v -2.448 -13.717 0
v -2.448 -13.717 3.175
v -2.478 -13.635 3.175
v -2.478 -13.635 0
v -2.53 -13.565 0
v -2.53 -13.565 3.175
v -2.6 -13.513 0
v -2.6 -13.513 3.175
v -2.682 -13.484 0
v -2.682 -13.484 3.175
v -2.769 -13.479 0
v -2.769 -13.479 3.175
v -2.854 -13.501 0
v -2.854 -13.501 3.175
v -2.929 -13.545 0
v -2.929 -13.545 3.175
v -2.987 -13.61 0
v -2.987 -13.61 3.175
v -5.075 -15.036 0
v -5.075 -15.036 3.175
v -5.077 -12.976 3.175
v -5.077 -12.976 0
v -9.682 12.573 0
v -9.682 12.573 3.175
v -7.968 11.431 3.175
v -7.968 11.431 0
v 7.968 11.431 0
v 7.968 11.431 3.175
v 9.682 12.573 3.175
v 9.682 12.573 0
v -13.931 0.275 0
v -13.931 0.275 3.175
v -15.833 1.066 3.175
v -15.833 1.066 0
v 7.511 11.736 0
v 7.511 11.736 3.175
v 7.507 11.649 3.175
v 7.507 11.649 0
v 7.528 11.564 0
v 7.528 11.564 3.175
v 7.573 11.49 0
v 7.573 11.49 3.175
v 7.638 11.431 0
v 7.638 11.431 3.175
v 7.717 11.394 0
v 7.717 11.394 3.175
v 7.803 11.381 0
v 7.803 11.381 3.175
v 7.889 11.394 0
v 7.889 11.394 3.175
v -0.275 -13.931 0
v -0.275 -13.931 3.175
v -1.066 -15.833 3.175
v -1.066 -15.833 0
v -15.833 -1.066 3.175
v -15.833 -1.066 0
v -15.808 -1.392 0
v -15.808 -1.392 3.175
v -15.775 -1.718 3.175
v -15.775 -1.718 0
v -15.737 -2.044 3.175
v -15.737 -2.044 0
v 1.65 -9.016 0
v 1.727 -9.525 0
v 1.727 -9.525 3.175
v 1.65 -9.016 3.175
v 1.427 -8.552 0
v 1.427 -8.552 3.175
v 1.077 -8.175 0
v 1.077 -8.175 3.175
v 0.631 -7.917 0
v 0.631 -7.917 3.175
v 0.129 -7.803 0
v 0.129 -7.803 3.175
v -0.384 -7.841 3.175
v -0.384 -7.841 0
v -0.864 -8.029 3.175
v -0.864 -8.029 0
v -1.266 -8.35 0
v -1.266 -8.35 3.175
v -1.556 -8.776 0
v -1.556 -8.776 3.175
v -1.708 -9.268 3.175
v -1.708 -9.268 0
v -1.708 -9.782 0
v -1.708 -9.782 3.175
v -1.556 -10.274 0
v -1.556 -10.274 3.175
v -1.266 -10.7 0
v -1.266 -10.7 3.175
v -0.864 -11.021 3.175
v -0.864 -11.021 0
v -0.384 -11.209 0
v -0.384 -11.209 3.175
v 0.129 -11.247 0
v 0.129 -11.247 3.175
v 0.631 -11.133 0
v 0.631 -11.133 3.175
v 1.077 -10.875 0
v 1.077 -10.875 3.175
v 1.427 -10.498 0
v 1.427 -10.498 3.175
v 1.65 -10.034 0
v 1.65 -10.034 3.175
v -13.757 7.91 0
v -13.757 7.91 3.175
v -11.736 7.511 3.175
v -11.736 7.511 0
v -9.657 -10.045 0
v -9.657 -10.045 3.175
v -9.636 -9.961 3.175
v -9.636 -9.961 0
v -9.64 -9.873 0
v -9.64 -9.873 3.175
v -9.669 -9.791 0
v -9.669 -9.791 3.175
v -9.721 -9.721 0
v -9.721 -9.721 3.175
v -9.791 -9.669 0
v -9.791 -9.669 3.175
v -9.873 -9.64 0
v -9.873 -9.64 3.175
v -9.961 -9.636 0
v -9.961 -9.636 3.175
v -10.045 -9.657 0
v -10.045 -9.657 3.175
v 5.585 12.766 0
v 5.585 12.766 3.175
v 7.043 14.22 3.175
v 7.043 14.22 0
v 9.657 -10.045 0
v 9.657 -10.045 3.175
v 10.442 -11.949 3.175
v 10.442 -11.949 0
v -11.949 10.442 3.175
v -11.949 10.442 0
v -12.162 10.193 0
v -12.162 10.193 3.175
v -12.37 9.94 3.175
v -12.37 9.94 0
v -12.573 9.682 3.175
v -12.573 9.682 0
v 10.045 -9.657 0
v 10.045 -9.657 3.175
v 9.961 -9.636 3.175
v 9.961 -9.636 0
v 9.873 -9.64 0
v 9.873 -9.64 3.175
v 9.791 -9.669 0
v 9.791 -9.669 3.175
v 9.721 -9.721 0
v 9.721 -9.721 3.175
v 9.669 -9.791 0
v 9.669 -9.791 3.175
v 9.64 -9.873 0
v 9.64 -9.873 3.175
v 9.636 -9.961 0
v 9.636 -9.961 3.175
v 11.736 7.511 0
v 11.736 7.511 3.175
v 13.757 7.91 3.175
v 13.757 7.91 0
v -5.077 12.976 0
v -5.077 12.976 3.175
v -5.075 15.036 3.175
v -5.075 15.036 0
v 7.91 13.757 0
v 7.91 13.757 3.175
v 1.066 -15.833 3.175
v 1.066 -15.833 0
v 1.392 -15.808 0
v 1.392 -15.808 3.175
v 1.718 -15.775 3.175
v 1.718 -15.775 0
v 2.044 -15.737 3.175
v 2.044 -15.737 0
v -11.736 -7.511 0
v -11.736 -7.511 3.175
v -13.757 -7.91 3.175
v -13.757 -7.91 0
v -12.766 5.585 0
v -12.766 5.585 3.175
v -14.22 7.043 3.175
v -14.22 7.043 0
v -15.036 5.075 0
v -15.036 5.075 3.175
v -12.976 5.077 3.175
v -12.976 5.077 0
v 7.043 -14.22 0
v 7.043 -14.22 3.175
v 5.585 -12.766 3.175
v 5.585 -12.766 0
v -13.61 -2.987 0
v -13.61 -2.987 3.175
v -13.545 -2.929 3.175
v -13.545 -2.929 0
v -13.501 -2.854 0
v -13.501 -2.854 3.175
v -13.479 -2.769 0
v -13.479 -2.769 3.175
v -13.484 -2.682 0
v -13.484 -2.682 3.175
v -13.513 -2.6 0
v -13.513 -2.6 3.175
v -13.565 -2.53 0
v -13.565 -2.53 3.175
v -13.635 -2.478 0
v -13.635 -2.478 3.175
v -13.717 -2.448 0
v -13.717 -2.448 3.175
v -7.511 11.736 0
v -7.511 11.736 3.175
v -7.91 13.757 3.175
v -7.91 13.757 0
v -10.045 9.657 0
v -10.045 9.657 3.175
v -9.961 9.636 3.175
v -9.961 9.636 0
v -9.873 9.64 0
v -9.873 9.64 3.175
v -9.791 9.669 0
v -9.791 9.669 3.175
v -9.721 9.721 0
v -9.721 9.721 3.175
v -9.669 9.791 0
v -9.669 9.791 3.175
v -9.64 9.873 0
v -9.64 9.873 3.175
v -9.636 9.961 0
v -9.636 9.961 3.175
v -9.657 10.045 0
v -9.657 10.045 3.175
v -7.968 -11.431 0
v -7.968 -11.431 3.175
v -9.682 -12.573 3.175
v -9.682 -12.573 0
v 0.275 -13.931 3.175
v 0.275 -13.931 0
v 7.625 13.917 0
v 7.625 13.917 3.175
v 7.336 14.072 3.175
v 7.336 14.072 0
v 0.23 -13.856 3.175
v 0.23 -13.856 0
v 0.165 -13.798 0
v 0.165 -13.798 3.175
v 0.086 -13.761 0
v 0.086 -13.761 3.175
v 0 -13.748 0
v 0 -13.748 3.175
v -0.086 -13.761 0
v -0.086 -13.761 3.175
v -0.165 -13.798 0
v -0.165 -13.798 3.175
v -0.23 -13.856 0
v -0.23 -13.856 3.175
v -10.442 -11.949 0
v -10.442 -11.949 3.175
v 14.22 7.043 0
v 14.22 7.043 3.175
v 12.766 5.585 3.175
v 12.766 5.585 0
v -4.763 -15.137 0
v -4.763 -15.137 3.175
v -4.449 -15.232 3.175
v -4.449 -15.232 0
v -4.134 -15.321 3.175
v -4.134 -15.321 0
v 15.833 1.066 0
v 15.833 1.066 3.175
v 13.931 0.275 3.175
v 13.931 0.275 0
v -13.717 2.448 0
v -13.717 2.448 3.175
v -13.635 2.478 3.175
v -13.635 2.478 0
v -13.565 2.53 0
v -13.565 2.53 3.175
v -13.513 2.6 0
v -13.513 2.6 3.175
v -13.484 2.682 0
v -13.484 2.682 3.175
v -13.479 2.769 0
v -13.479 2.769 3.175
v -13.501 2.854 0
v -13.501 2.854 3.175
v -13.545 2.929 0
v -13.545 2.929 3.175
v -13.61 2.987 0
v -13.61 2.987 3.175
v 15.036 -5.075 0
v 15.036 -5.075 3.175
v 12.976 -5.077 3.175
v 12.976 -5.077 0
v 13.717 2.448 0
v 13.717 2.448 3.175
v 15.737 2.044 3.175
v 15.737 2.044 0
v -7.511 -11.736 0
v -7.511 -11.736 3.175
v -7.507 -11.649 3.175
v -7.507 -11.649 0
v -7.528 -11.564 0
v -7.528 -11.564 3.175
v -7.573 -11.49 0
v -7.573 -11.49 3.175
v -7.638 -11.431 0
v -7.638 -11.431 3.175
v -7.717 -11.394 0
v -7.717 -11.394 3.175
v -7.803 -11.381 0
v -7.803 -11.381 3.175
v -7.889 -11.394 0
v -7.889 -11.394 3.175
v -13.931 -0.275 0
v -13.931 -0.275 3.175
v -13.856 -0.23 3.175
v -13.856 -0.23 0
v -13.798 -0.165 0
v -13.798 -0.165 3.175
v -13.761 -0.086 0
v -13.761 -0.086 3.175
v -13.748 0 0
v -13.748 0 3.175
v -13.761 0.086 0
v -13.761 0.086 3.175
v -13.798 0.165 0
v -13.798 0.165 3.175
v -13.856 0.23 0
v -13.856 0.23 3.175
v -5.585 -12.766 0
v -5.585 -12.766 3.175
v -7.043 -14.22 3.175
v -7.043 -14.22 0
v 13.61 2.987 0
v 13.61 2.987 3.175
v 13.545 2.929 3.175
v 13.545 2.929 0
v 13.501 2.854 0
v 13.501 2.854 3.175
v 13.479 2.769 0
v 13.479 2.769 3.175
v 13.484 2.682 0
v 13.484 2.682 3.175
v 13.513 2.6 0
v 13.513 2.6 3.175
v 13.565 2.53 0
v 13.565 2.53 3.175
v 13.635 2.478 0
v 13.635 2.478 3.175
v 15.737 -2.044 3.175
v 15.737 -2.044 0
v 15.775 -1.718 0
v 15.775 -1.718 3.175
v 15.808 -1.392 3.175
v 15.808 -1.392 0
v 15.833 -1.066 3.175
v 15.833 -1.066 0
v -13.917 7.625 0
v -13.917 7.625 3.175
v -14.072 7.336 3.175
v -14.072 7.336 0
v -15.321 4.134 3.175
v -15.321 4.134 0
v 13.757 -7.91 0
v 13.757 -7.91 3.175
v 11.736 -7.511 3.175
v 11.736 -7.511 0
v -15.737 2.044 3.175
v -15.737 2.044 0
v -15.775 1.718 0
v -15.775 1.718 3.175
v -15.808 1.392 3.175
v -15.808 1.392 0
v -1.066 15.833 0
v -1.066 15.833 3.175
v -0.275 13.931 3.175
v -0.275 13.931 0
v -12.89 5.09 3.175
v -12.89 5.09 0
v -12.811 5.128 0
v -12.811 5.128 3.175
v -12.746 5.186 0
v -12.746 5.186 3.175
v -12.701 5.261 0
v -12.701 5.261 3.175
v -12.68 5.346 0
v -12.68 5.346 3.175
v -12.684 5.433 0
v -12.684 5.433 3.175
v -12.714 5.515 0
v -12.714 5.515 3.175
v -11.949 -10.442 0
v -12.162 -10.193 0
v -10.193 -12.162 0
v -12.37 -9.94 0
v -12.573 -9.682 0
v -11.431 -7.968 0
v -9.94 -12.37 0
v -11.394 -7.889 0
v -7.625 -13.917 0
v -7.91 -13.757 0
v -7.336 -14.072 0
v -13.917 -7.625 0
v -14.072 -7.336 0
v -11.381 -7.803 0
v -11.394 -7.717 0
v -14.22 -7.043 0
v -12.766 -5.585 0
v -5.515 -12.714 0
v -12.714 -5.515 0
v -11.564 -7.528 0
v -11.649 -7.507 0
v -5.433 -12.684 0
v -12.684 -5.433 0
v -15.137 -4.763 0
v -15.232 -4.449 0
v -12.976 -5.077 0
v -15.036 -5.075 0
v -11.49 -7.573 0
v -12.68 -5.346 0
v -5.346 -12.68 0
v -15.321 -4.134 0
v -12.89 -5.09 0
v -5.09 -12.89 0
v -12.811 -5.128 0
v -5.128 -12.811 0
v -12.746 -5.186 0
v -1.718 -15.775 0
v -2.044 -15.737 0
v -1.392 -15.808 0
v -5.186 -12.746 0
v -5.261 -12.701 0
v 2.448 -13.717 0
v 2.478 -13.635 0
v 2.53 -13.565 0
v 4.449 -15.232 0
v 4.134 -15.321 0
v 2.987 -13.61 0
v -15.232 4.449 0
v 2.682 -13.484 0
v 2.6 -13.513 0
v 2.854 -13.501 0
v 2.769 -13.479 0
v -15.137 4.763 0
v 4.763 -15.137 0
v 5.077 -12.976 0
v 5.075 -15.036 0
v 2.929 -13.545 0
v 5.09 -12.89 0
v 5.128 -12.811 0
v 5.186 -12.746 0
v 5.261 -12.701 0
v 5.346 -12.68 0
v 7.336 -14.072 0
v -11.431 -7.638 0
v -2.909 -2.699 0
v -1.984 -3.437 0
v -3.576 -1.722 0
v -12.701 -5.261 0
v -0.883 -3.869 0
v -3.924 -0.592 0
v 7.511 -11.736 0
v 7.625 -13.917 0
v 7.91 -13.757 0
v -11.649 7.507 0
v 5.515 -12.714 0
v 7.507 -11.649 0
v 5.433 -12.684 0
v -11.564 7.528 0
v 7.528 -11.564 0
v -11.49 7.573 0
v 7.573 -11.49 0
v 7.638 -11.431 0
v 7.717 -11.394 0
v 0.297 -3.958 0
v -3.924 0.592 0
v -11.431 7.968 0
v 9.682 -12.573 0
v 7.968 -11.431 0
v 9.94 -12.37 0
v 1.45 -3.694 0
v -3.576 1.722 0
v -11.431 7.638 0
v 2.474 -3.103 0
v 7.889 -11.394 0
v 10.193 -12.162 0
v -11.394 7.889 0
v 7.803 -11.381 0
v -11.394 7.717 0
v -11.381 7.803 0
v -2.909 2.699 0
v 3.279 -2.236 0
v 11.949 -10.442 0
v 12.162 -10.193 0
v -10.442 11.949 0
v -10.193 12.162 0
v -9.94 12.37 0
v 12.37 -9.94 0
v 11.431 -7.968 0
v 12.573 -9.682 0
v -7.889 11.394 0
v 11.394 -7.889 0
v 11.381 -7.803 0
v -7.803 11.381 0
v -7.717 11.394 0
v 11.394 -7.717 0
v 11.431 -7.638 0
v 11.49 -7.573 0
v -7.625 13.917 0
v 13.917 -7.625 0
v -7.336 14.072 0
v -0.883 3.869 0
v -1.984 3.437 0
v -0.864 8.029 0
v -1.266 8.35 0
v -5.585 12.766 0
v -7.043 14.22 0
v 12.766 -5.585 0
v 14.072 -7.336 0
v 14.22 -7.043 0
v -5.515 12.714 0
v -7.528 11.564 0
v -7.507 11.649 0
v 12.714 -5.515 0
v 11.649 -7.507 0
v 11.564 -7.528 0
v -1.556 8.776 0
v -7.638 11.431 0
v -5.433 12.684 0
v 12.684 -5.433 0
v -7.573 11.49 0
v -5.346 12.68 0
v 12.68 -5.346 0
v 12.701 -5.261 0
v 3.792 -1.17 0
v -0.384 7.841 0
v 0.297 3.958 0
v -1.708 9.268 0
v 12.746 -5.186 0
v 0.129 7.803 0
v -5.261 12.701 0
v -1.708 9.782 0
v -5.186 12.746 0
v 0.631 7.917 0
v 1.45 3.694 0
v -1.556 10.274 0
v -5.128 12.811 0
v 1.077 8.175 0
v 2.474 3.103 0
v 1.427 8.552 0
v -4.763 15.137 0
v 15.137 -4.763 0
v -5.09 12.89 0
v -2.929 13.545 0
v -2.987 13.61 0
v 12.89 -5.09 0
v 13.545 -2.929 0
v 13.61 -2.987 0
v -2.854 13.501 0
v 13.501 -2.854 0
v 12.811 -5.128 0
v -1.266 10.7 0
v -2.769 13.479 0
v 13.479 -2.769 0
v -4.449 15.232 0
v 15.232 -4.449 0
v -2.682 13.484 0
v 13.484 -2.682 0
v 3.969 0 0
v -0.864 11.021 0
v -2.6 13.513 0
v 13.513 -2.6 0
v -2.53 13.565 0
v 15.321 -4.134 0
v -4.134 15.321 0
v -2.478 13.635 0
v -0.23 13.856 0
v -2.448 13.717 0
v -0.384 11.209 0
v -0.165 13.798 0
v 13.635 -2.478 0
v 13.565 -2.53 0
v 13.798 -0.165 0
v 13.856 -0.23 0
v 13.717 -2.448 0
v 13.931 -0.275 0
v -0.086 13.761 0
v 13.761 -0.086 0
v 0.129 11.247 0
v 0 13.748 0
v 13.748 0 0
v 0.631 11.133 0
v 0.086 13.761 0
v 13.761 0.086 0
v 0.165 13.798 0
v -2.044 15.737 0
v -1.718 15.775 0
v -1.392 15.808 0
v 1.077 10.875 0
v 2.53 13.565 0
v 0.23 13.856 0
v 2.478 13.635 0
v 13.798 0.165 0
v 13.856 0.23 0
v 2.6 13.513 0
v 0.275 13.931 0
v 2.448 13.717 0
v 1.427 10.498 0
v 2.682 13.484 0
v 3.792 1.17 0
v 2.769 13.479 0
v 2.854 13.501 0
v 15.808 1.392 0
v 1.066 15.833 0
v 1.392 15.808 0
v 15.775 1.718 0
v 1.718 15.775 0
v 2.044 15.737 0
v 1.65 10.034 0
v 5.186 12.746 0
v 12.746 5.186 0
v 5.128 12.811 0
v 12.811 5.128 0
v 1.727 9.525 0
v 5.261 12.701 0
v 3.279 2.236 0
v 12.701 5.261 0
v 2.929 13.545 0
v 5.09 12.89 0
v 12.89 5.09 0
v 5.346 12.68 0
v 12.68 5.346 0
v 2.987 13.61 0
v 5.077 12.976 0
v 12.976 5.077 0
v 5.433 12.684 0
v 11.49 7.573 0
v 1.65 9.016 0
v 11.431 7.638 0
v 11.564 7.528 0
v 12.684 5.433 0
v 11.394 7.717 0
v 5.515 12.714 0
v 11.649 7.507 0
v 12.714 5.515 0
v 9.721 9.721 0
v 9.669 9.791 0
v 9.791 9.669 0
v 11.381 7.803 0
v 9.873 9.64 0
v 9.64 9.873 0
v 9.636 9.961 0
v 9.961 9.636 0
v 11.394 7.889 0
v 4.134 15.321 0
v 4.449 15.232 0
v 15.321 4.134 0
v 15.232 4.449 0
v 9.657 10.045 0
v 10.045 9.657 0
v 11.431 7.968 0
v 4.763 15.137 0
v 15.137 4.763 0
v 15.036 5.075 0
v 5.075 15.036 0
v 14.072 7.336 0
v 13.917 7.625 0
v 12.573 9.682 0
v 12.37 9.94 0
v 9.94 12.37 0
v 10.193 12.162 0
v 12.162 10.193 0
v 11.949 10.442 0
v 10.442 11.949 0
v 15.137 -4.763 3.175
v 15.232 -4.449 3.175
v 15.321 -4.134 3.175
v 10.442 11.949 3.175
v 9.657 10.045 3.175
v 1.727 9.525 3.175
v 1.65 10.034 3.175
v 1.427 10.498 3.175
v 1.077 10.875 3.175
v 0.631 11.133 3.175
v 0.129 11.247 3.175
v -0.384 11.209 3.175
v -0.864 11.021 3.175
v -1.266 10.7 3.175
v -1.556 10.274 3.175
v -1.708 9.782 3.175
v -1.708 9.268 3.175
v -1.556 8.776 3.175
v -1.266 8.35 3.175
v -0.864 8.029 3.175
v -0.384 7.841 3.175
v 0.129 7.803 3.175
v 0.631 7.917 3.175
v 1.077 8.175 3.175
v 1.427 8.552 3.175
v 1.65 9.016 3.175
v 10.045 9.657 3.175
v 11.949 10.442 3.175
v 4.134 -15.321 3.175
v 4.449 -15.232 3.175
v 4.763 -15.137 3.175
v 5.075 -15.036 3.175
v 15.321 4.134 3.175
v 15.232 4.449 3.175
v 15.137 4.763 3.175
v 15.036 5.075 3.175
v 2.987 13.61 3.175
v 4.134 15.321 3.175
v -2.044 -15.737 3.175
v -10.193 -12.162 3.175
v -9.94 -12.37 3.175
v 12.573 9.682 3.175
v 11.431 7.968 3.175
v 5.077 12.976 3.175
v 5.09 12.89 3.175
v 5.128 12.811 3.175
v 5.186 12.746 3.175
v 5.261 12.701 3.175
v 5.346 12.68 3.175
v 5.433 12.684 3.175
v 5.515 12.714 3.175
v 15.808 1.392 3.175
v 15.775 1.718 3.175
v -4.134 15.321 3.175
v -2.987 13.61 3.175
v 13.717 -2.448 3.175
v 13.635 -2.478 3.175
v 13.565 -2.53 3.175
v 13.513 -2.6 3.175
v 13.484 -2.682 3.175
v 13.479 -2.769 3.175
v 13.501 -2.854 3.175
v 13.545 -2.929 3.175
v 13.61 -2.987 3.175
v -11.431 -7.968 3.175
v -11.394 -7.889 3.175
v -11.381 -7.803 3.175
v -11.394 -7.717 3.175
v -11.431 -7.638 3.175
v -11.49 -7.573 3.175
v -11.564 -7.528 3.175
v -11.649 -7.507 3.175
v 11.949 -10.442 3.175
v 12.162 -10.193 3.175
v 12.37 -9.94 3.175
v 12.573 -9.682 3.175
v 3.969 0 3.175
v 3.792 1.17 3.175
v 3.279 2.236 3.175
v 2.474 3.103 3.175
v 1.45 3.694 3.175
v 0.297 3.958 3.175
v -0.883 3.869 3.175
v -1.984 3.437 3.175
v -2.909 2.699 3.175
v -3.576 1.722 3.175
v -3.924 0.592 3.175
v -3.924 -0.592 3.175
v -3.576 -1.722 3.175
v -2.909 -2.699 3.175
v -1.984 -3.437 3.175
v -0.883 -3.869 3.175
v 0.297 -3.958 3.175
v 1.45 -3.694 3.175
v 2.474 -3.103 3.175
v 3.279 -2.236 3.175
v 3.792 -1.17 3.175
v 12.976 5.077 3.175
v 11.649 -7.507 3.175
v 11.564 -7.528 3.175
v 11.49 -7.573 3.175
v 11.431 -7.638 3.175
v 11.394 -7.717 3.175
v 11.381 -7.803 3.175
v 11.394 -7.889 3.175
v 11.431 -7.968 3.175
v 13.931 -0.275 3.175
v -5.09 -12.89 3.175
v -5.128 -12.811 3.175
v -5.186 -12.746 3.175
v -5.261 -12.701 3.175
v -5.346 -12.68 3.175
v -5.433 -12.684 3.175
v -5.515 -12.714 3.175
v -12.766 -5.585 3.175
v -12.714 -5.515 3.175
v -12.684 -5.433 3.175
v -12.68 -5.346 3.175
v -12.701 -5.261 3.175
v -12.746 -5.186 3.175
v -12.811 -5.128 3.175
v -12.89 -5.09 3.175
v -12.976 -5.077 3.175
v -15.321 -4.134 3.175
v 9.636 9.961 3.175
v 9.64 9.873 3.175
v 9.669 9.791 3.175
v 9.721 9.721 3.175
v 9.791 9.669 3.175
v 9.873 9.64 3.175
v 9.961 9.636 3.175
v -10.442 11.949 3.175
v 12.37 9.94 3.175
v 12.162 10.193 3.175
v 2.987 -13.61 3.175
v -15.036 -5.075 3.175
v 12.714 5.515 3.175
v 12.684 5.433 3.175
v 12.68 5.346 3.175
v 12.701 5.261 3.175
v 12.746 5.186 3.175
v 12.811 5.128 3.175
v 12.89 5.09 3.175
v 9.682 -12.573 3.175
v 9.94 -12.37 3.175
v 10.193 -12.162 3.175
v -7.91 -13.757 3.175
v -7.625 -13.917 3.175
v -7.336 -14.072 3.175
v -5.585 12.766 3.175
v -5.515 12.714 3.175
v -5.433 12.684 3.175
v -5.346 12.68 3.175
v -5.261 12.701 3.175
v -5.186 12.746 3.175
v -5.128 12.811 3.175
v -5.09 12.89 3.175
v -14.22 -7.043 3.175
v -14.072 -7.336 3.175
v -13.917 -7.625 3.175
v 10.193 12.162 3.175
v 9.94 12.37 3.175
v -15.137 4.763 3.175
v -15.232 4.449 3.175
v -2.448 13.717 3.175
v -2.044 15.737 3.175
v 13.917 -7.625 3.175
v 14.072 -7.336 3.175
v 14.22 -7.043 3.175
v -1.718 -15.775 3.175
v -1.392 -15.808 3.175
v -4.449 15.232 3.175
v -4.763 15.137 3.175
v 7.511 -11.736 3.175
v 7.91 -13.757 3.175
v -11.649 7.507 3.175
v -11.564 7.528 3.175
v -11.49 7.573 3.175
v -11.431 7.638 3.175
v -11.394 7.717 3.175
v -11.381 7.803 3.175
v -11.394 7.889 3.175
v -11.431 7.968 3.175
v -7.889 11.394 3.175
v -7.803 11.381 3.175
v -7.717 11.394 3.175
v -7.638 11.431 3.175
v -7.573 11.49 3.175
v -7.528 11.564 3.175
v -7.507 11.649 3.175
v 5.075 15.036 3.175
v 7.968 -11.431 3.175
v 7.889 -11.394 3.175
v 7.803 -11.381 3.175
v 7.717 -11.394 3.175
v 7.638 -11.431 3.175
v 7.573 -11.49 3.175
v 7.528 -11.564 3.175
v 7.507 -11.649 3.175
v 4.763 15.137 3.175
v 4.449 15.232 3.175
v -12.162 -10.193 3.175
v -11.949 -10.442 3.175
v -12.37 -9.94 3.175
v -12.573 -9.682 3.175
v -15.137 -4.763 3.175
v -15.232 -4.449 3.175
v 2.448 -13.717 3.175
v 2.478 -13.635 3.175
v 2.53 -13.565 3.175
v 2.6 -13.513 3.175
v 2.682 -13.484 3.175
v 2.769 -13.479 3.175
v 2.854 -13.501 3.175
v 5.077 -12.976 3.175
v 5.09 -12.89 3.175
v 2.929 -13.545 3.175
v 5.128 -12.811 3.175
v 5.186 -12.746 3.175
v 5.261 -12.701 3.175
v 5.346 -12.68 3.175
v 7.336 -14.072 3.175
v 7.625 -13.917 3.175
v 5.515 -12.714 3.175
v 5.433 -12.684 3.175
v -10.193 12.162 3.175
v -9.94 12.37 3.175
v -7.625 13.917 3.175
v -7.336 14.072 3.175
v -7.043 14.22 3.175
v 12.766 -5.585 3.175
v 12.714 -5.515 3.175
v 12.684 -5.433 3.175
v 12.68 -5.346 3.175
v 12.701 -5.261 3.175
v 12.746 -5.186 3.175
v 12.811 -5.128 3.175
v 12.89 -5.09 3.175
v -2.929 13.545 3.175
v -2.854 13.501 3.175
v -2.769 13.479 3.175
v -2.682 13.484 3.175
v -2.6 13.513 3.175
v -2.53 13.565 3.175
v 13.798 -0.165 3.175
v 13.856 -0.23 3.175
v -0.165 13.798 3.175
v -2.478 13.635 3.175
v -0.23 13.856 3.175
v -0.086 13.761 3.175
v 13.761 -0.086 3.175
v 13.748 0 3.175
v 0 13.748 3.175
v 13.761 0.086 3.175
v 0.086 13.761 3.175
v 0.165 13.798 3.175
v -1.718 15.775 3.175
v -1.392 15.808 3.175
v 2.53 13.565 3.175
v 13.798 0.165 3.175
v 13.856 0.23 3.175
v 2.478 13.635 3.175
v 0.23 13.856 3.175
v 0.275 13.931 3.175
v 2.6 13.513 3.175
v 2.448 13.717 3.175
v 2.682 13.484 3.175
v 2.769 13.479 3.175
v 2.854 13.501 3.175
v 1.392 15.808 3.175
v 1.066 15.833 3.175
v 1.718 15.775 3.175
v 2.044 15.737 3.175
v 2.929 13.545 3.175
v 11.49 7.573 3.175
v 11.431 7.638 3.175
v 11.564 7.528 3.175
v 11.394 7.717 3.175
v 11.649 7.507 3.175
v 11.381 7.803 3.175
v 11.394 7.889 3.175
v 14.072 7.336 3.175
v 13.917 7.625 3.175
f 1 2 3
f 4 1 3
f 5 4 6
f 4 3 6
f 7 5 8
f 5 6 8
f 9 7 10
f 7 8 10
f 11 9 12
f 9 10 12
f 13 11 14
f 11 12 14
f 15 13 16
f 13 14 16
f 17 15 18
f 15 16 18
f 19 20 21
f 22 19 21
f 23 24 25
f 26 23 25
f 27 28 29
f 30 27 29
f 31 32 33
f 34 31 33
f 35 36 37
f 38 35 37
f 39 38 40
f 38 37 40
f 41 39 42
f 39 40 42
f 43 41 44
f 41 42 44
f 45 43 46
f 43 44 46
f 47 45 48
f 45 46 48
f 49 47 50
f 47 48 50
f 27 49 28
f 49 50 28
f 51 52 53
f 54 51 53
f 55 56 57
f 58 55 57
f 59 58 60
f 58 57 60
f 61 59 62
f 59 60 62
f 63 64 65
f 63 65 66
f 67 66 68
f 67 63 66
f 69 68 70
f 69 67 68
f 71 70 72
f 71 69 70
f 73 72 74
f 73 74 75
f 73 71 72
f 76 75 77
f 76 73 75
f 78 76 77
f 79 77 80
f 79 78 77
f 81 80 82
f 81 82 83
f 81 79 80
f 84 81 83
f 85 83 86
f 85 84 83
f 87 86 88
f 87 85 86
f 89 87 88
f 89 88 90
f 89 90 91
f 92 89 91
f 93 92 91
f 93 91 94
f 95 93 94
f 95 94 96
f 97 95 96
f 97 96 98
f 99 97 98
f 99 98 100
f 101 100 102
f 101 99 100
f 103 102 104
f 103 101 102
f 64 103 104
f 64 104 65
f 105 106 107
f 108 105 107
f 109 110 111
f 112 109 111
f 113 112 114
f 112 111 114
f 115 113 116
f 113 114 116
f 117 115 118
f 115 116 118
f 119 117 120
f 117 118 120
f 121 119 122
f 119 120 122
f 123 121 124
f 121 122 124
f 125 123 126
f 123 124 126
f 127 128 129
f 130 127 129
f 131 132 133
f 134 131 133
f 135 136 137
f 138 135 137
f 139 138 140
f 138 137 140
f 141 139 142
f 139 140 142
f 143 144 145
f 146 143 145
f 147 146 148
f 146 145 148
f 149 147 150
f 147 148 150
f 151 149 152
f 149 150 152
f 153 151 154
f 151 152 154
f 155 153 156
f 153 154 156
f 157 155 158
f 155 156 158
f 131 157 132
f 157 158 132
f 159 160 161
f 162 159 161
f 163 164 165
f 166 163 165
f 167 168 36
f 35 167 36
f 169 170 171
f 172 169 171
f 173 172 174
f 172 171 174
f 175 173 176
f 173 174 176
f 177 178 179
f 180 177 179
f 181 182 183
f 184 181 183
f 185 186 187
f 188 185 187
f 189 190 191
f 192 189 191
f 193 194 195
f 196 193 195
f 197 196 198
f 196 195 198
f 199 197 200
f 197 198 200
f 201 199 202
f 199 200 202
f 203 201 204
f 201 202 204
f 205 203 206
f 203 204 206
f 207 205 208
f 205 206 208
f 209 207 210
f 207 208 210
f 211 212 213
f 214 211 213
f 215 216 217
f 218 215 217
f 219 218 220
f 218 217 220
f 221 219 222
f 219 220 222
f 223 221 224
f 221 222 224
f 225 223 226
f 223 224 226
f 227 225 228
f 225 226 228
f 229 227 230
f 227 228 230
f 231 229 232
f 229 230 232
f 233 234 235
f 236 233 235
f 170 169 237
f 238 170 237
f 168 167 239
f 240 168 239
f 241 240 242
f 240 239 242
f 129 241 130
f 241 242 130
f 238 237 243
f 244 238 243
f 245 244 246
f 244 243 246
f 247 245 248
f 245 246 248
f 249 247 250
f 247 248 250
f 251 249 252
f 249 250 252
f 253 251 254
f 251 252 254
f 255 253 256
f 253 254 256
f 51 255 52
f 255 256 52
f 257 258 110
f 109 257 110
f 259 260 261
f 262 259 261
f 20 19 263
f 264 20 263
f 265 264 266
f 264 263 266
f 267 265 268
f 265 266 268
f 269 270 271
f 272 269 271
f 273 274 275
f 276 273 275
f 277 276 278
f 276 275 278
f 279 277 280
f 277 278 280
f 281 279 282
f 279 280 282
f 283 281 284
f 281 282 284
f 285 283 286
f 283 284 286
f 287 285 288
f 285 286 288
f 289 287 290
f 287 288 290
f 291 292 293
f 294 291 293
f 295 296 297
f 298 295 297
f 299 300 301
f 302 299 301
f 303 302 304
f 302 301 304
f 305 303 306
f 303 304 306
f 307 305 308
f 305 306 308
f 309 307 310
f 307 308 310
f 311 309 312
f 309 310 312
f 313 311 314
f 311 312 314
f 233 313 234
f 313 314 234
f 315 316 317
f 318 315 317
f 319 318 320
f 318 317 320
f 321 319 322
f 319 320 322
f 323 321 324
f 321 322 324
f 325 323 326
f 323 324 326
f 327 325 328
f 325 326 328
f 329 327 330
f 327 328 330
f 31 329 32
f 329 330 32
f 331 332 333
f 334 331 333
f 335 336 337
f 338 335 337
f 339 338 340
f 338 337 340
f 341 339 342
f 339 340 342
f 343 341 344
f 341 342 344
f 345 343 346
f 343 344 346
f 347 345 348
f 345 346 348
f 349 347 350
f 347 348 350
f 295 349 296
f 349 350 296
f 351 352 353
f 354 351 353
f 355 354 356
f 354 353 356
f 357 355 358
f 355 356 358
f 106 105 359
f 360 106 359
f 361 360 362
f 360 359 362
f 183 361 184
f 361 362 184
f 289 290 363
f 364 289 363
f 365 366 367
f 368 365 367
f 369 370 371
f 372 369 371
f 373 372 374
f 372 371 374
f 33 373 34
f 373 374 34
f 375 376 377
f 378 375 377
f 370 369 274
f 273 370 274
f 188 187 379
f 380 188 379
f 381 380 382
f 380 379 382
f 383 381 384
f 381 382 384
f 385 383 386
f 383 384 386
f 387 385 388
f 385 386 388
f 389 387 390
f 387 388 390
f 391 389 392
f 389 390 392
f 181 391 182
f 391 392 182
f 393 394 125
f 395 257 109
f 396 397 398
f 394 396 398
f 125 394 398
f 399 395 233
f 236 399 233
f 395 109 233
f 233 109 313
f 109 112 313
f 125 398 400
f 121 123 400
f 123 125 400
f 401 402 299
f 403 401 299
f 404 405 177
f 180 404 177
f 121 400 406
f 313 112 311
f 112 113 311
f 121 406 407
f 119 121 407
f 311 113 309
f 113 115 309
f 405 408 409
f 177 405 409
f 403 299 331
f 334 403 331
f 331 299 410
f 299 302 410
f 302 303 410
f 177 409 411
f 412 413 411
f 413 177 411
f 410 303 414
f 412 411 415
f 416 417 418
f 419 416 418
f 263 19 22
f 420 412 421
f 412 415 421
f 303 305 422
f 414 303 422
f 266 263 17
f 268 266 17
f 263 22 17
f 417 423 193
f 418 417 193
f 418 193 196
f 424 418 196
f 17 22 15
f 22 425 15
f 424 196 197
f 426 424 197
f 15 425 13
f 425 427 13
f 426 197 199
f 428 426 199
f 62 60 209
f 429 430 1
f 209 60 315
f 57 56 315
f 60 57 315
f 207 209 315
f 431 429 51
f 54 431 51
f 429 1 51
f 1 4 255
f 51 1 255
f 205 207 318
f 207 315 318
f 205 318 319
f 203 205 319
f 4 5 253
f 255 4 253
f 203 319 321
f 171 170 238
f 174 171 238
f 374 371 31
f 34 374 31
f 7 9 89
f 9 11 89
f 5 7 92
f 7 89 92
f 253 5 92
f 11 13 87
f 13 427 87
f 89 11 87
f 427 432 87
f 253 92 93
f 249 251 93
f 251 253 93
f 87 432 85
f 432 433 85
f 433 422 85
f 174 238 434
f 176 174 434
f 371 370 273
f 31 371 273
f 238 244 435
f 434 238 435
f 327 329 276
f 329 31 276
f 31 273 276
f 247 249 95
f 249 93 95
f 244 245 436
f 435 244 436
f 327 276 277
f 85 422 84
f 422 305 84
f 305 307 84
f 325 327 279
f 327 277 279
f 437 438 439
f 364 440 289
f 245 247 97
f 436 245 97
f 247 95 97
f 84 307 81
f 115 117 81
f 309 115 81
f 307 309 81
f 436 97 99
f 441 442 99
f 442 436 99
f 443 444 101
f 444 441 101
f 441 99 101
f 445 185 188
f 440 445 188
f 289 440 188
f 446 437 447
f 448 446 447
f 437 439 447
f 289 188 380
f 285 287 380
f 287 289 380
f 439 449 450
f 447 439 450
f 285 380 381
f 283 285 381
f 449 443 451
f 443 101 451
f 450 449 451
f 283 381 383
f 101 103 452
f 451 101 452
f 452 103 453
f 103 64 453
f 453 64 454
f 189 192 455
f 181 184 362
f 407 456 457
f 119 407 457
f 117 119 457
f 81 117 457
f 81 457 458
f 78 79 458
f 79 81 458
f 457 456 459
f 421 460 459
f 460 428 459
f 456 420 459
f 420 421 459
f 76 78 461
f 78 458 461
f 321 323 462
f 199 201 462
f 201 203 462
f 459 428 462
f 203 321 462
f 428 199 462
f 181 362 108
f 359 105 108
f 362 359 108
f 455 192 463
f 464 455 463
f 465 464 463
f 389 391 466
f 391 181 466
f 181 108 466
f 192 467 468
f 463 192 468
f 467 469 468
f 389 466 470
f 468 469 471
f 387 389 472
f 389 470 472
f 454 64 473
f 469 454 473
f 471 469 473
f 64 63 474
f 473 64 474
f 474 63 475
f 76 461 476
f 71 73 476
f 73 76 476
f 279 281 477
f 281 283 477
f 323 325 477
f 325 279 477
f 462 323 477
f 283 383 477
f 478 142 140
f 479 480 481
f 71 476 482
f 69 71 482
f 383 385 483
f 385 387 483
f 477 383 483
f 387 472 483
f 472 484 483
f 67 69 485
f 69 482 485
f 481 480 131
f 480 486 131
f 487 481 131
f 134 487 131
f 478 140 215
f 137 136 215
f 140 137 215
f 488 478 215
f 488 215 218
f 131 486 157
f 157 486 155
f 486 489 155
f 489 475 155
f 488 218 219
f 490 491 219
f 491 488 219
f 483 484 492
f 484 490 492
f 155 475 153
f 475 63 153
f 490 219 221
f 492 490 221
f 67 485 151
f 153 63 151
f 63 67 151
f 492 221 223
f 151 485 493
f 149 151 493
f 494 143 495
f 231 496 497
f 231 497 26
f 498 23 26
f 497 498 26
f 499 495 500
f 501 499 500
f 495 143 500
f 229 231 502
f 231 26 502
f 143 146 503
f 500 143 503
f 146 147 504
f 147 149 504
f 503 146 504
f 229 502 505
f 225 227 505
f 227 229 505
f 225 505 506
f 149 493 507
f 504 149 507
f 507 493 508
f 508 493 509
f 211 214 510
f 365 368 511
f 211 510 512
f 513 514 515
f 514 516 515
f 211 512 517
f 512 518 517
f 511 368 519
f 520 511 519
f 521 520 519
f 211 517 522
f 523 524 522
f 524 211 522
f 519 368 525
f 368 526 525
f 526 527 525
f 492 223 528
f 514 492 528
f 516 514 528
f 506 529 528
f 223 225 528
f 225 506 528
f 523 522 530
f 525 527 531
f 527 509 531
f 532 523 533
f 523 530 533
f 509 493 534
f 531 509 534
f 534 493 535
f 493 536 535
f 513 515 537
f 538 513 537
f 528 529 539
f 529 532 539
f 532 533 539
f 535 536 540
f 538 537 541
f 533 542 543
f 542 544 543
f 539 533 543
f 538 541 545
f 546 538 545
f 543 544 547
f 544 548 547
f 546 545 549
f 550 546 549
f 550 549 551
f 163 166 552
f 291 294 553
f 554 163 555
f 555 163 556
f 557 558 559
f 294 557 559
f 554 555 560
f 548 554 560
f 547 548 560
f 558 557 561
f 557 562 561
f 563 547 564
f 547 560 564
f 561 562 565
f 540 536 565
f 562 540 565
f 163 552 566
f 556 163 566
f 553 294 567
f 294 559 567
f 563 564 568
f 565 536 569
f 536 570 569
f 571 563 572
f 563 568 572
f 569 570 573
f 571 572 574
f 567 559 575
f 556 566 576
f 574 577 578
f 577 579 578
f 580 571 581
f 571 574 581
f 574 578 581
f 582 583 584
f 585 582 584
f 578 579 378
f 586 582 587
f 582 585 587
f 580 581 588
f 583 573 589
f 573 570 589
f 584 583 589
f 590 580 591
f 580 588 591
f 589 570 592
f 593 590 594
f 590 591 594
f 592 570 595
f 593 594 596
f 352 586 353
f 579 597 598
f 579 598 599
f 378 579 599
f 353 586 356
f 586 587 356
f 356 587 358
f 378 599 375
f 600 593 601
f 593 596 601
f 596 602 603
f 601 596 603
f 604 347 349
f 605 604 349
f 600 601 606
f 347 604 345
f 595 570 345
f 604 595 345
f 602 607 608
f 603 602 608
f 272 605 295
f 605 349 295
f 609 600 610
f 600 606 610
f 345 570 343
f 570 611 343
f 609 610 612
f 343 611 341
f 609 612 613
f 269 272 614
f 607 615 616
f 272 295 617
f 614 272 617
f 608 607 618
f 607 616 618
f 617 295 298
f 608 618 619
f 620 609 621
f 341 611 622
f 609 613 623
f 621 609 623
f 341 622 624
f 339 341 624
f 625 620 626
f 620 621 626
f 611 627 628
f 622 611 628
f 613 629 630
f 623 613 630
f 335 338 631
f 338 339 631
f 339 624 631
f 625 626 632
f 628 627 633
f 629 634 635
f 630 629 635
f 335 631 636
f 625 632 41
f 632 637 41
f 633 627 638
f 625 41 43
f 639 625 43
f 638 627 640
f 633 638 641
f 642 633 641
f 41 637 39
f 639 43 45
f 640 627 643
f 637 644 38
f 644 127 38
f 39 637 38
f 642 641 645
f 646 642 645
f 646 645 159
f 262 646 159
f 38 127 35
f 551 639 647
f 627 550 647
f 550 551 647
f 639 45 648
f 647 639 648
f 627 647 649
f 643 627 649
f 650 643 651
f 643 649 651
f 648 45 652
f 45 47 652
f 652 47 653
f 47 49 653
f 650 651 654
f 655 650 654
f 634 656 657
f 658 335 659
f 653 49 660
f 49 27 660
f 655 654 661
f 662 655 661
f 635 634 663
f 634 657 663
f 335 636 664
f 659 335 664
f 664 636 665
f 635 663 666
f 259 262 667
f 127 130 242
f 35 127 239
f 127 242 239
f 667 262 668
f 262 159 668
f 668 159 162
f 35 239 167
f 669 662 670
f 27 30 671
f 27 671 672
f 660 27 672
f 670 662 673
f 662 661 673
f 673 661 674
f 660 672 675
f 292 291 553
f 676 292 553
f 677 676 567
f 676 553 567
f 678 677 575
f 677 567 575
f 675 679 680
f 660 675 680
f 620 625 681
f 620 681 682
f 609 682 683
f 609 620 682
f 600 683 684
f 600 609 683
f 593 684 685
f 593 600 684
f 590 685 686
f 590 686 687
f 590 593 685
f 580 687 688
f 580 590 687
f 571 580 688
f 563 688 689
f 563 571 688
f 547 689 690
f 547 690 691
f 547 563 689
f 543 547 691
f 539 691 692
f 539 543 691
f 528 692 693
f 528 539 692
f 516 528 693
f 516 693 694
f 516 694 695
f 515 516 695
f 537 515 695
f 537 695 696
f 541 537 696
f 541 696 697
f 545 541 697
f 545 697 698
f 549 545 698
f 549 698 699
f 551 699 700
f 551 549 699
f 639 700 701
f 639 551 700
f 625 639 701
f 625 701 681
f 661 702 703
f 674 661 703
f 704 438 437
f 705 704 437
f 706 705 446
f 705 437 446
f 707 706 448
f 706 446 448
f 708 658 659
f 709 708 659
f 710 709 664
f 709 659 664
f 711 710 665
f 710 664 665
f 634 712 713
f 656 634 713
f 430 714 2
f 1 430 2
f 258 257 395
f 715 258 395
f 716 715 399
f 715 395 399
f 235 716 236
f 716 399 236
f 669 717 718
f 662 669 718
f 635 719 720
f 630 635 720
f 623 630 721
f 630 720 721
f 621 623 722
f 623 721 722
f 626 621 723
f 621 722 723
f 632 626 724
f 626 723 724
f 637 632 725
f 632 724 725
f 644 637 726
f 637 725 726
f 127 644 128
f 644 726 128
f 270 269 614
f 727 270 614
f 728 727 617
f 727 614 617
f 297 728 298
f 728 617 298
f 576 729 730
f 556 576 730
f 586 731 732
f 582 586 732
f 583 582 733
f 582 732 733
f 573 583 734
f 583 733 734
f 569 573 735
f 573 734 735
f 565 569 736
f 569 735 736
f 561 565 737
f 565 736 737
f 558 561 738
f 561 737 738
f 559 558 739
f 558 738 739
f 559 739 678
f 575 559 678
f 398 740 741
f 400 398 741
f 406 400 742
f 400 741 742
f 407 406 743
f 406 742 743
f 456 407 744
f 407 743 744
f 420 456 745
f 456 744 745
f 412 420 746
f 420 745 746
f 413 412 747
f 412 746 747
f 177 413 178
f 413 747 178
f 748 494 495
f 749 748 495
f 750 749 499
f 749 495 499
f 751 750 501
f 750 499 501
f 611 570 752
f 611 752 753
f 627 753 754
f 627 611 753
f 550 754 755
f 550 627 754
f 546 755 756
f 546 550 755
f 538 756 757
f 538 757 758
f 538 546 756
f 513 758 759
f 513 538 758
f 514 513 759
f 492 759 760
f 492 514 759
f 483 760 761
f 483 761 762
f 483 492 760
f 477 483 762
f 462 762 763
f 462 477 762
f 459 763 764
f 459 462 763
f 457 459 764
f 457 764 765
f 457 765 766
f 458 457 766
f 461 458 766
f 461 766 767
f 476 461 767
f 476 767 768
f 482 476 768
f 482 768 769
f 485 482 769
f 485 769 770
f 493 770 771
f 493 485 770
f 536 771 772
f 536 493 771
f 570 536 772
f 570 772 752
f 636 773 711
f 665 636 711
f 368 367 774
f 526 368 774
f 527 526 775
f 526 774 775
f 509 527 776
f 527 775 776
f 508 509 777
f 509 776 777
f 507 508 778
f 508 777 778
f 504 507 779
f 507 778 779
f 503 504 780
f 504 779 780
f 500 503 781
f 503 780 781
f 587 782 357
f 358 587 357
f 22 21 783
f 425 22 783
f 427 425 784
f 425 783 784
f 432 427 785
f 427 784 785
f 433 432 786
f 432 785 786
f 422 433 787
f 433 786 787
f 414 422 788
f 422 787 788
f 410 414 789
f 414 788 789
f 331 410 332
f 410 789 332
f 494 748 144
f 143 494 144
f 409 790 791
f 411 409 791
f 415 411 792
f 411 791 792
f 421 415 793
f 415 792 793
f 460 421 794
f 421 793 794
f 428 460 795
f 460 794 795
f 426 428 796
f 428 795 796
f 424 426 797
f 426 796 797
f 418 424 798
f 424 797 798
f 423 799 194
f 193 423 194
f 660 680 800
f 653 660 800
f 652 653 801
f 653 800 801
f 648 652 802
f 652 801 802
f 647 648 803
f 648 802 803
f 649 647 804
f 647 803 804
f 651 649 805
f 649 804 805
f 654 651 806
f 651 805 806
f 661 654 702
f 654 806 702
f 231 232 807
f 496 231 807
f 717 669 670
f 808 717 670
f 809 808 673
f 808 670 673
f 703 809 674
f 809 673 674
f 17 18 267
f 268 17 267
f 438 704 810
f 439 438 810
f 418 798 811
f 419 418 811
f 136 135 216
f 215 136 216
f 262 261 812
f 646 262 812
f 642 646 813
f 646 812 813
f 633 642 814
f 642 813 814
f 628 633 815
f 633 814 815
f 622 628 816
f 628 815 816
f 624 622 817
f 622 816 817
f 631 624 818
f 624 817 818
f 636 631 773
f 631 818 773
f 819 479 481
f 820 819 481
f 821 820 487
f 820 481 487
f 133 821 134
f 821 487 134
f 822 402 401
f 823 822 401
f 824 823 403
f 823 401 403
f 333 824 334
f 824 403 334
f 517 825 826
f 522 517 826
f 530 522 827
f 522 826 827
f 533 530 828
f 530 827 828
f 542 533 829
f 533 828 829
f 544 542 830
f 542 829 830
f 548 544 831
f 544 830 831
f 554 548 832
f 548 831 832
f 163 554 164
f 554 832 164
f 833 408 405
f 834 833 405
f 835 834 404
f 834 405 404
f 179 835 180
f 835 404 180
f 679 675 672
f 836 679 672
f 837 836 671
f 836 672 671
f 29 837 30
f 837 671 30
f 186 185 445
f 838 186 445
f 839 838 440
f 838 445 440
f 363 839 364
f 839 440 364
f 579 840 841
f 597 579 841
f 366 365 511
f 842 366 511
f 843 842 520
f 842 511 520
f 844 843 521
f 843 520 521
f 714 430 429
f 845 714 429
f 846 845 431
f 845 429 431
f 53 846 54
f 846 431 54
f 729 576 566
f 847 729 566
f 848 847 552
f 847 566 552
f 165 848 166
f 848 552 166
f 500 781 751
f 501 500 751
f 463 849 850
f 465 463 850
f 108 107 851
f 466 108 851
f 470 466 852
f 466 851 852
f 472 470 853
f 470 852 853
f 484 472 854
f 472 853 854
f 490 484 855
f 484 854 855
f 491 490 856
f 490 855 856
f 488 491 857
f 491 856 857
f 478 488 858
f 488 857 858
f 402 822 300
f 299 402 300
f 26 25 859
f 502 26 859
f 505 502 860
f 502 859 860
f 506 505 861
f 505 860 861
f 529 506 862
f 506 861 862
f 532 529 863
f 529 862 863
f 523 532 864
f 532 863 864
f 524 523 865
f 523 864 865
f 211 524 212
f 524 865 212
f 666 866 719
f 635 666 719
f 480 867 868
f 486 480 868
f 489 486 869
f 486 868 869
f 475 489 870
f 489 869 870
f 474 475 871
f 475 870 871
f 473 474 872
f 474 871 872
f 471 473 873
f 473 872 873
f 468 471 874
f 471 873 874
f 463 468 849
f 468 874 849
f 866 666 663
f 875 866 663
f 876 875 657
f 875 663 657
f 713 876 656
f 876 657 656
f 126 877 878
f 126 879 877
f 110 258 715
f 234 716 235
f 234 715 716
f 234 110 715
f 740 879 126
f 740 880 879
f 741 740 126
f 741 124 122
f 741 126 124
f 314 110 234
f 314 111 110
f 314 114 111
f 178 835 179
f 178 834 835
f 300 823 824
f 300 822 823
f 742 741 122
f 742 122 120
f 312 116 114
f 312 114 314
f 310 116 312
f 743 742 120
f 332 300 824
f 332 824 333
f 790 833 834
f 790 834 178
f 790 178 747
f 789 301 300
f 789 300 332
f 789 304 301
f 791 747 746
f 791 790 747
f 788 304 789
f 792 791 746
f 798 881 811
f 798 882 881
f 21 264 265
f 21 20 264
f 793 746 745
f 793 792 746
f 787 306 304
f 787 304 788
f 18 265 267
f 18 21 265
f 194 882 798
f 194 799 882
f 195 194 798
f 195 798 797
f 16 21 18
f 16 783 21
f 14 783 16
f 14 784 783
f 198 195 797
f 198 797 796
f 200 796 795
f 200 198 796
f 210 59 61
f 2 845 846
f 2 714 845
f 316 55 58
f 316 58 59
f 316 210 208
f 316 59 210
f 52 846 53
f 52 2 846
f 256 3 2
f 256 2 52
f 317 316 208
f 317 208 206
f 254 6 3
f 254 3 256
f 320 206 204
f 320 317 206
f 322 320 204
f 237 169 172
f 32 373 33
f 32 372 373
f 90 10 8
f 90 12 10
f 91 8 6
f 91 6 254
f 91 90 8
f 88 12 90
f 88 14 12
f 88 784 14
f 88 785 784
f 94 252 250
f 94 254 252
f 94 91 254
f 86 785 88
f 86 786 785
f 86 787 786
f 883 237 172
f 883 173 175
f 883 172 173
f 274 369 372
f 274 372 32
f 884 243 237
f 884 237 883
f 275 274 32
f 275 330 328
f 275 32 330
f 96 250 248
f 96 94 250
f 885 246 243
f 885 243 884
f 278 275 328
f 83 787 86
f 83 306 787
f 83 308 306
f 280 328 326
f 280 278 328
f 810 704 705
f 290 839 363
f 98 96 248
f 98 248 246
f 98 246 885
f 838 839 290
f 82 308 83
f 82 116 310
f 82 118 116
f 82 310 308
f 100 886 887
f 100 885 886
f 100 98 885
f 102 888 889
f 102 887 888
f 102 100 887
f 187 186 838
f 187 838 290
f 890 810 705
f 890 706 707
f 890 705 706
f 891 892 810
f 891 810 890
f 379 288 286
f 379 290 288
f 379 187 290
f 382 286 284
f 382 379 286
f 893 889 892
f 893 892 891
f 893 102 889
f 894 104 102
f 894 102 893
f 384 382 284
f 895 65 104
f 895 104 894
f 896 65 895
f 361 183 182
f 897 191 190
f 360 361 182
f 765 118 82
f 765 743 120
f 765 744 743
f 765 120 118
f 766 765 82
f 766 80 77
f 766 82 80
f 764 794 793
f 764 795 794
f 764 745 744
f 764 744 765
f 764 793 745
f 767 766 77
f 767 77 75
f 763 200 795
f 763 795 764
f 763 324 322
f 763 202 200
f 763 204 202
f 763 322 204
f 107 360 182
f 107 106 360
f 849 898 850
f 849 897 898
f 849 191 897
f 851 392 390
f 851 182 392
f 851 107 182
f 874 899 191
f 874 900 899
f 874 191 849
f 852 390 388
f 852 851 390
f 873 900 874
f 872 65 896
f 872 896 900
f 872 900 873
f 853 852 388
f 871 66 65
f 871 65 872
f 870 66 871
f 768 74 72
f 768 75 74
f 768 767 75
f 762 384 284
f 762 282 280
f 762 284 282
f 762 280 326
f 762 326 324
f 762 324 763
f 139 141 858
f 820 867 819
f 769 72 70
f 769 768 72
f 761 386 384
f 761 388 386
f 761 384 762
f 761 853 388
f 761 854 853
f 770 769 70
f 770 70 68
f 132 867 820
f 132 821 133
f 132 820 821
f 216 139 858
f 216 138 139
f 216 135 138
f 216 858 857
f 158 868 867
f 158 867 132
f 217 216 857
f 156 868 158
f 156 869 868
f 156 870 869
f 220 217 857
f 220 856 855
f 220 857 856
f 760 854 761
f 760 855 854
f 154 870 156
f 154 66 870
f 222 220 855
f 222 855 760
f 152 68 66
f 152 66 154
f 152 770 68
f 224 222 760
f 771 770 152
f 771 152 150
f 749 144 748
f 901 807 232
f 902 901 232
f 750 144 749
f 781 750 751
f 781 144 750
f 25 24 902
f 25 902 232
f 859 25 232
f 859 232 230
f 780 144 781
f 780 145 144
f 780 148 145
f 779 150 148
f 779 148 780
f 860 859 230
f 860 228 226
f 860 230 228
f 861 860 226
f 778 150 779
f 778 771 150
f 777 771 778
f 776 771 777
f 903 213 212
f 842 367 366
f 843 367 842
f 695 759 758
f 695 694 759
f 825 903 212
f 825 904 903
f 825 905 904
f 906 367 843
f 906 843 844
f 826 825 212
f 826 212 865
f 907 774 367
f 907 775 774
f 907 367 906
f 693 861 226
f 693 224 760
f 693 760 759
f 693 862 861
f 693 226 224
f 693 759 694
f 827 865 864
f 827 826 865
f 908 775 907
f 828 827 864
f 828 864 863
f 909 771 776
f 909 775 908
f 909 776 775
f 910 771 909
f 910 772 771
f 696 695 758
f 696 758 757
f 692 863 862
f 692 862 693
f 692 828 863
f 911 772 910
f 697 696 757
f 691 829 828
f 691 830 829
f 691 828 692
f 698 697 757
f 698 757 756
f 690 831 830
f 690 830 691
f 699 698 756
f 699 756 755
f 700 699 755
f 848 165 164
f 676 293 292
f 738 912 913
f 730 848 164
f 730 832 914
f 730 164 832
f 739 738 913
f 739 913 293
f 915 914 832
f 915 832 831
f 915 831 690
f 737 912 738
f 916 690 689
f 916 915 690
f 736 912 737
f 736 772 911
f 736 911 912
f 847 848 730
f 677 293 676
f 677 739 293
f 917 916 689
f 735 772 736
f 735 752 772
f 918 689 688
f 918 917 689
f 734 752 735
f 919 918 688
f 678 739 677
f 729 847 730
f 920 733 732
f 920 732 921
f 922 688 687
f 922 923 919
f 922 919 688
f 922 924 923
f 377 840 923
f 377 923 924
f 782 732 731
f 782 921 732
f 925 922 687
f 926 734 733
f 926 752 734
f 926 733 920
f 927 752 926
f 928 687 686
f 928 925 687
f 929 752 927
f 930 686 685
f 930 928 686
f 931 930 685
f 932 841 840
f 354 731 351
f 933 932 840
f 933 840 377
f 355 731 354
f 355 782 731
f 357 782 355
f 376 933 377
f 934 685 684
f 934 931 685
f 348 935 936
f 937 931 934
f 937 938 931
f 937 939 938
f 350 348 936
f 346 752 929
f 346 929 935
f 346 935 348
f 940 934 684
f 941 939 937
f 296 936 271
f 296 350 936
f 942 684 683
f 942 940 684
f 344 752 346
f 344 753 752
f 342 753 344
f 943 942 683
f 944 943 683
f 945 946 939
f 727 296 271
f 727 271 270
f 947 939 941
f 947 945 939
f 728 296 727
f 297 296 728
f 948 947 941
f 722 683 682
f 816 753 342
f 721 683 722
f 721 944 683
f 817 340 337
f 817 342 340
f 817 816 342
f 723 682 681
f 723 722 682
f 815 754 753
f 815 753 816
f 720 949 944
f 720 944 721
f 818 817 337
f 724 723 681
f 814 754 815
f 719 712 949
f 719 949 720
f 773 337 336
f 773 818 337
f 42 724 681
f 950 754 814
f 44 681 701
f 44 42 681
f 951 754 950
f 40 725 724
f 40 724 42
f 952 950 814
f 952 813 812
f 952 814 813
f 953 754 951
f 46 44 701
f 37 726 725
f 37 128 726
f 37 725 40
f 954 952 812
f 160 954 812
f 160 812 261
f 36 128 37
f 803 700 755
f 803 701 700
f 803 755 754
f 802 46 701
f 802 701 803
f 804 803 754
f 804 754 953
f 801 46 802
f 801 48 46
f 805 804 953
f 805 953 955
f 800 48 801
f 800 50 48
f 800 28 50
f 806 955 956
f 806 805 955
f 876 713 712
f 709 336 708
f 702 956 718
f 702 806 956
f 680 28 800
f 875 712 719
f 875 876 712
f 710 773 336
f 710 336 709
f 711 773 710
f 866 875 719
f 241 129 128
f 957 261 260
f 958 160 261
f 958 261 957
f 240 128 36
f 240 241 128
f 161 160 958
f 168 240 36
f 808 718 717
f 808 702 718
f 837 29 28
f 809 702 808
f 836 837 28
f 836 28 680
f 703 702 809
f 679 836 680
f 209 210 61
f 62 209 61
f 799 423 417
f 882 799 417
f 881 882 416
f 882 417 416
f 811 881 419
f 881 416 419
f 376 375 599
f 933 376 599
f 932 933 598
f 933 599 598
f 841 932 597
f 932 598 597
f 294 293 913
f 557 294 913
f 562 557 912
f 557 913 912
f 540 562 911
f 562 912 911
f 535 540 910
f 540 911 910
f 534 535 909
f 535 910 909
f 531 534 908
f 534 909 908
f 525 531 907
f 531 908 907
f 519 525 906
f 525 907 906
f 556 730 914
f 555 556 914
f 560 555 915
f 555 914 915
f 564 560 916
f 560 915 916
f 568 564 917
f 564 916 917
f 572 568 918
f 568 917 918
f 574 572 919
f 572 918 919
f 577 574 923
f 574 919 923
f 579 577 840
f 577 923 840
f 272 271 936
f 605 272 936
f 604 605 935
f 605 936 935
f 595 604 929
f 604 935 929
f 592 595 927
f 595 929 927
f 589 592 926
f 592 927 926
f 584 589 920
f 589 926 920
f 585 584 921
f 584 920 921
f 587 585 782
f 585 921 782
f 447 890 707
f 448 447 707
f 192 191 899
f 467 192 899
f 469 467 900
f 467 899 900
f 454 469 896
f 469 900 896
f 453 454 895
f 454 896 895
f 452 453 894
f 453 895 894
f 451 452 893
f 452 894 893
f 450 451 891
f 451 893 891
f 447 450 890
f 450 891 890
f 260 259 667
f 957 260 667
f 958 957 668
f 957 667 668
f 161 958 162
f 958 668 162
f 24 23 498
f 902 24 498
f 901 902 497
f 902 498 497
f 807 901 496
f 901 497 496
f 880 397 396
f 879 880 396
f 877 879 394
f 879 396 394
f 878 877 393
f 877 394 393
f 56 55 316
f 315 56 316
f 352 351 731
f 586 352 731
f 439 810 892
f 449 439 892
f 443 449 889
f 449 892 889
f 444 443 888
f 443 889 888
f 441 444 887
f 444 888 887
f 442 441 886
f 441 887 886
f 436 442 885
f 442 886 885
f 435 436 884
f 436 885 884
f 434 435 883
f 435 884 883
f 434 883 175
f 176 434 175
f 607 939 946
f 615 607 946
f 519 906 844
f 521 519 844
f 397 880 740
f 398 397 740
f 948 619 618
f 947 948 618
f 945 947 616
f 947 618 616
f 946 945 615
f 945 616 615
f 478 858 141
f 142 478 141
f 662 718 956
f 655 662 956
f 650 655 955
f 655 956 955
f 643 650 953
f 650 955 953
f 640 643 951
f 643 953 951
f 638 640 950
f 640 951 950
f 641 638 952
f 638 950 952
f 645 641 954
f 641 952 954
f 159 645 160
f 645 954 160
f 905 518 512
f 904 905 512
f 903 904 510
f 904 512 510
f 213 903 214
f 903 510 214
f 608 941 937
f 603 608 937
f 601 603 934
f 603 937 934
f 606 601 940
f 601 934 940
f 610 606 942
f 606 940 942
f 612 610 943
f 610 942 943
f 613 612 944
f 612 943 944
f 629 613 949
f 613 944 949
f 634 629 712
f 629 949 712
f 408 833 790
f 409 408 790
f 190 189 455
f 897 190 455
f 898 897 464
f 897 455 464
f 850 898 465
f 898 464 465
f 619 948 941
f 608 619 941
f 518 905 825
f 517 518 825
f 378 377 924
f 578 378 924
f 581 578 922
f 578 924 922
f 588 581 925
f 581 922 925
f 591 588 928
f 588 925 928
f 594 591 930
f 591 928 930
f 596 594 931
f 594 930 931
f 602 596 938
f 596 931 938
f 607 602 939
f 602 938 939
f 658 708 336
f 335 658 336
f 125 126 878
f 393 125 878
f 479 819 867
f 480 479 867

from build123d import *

# Parameters (mm, degrees)
F0_R            = 15.8688012495
F0_R_2          = 1.7272
F0_R_3          = 3.96875
F1_DEPTH        = 3.175
F3_DEPTH        = 3.175
F3_COPIES_COUNT = 32


# Not quite as in the source:
# - a pattern or mirror of a feature is missing from the dataset's text; its kind, count and spacing are read off the source's solid


with BuildPart() as f1:
    # F0 (on Top) → F1 (new body)
    with BuildSketch(Plane.XY):
        Circle(F0_R)
        with Locations((0, -9.525)):
            Circle(F0_R_2, mode=Mode.SUBTRACT)
        Circle(F0_R_3, mode=Mode.SUBTRACT)
        with Locations((0, 9.525)):
            Circle(F0_R_2, mode=Mode.SUBTRACT)
    extrude(amount=F1_DEPTH)

    # F2 (on face) → F3 (cut, through all)
    with BuildSketch(Plane.XY.offset(3.175)):
        with BuildLine():
            Line((-13.9312413972, 0.274735453), (-15.8329891451, 1.065508248))
            ThreePointArc((-15.8329891451, 1.065508248), (-15.8688012495, 0), (-15.8329891451, -1.065508248))
            Line((-15.8329891451, -1.065508248), (-13.9312413972, -0.274735453))
            ThreePointArc((-13.9312413972, -0.274735453), (-13.747940143, 0), (-13.9312413972, 0.274735453))
        make_face()
    f3 = extrude(amount=-F3_DEPTH, mode=Mode.SUBTRACT)

    # F3_copies: F3 ×32 about axis
    f3_copies_axis = Axis((0, 0, 0), (0, 0, 1))
    for i in range(1, F3_COPIES_COUNT):
        add(f3.rotate(f3_copies_axis, i * 360 / F3_COPIES_COUNT), mode=Mode.SUBTRACT)


solid = f1.part
